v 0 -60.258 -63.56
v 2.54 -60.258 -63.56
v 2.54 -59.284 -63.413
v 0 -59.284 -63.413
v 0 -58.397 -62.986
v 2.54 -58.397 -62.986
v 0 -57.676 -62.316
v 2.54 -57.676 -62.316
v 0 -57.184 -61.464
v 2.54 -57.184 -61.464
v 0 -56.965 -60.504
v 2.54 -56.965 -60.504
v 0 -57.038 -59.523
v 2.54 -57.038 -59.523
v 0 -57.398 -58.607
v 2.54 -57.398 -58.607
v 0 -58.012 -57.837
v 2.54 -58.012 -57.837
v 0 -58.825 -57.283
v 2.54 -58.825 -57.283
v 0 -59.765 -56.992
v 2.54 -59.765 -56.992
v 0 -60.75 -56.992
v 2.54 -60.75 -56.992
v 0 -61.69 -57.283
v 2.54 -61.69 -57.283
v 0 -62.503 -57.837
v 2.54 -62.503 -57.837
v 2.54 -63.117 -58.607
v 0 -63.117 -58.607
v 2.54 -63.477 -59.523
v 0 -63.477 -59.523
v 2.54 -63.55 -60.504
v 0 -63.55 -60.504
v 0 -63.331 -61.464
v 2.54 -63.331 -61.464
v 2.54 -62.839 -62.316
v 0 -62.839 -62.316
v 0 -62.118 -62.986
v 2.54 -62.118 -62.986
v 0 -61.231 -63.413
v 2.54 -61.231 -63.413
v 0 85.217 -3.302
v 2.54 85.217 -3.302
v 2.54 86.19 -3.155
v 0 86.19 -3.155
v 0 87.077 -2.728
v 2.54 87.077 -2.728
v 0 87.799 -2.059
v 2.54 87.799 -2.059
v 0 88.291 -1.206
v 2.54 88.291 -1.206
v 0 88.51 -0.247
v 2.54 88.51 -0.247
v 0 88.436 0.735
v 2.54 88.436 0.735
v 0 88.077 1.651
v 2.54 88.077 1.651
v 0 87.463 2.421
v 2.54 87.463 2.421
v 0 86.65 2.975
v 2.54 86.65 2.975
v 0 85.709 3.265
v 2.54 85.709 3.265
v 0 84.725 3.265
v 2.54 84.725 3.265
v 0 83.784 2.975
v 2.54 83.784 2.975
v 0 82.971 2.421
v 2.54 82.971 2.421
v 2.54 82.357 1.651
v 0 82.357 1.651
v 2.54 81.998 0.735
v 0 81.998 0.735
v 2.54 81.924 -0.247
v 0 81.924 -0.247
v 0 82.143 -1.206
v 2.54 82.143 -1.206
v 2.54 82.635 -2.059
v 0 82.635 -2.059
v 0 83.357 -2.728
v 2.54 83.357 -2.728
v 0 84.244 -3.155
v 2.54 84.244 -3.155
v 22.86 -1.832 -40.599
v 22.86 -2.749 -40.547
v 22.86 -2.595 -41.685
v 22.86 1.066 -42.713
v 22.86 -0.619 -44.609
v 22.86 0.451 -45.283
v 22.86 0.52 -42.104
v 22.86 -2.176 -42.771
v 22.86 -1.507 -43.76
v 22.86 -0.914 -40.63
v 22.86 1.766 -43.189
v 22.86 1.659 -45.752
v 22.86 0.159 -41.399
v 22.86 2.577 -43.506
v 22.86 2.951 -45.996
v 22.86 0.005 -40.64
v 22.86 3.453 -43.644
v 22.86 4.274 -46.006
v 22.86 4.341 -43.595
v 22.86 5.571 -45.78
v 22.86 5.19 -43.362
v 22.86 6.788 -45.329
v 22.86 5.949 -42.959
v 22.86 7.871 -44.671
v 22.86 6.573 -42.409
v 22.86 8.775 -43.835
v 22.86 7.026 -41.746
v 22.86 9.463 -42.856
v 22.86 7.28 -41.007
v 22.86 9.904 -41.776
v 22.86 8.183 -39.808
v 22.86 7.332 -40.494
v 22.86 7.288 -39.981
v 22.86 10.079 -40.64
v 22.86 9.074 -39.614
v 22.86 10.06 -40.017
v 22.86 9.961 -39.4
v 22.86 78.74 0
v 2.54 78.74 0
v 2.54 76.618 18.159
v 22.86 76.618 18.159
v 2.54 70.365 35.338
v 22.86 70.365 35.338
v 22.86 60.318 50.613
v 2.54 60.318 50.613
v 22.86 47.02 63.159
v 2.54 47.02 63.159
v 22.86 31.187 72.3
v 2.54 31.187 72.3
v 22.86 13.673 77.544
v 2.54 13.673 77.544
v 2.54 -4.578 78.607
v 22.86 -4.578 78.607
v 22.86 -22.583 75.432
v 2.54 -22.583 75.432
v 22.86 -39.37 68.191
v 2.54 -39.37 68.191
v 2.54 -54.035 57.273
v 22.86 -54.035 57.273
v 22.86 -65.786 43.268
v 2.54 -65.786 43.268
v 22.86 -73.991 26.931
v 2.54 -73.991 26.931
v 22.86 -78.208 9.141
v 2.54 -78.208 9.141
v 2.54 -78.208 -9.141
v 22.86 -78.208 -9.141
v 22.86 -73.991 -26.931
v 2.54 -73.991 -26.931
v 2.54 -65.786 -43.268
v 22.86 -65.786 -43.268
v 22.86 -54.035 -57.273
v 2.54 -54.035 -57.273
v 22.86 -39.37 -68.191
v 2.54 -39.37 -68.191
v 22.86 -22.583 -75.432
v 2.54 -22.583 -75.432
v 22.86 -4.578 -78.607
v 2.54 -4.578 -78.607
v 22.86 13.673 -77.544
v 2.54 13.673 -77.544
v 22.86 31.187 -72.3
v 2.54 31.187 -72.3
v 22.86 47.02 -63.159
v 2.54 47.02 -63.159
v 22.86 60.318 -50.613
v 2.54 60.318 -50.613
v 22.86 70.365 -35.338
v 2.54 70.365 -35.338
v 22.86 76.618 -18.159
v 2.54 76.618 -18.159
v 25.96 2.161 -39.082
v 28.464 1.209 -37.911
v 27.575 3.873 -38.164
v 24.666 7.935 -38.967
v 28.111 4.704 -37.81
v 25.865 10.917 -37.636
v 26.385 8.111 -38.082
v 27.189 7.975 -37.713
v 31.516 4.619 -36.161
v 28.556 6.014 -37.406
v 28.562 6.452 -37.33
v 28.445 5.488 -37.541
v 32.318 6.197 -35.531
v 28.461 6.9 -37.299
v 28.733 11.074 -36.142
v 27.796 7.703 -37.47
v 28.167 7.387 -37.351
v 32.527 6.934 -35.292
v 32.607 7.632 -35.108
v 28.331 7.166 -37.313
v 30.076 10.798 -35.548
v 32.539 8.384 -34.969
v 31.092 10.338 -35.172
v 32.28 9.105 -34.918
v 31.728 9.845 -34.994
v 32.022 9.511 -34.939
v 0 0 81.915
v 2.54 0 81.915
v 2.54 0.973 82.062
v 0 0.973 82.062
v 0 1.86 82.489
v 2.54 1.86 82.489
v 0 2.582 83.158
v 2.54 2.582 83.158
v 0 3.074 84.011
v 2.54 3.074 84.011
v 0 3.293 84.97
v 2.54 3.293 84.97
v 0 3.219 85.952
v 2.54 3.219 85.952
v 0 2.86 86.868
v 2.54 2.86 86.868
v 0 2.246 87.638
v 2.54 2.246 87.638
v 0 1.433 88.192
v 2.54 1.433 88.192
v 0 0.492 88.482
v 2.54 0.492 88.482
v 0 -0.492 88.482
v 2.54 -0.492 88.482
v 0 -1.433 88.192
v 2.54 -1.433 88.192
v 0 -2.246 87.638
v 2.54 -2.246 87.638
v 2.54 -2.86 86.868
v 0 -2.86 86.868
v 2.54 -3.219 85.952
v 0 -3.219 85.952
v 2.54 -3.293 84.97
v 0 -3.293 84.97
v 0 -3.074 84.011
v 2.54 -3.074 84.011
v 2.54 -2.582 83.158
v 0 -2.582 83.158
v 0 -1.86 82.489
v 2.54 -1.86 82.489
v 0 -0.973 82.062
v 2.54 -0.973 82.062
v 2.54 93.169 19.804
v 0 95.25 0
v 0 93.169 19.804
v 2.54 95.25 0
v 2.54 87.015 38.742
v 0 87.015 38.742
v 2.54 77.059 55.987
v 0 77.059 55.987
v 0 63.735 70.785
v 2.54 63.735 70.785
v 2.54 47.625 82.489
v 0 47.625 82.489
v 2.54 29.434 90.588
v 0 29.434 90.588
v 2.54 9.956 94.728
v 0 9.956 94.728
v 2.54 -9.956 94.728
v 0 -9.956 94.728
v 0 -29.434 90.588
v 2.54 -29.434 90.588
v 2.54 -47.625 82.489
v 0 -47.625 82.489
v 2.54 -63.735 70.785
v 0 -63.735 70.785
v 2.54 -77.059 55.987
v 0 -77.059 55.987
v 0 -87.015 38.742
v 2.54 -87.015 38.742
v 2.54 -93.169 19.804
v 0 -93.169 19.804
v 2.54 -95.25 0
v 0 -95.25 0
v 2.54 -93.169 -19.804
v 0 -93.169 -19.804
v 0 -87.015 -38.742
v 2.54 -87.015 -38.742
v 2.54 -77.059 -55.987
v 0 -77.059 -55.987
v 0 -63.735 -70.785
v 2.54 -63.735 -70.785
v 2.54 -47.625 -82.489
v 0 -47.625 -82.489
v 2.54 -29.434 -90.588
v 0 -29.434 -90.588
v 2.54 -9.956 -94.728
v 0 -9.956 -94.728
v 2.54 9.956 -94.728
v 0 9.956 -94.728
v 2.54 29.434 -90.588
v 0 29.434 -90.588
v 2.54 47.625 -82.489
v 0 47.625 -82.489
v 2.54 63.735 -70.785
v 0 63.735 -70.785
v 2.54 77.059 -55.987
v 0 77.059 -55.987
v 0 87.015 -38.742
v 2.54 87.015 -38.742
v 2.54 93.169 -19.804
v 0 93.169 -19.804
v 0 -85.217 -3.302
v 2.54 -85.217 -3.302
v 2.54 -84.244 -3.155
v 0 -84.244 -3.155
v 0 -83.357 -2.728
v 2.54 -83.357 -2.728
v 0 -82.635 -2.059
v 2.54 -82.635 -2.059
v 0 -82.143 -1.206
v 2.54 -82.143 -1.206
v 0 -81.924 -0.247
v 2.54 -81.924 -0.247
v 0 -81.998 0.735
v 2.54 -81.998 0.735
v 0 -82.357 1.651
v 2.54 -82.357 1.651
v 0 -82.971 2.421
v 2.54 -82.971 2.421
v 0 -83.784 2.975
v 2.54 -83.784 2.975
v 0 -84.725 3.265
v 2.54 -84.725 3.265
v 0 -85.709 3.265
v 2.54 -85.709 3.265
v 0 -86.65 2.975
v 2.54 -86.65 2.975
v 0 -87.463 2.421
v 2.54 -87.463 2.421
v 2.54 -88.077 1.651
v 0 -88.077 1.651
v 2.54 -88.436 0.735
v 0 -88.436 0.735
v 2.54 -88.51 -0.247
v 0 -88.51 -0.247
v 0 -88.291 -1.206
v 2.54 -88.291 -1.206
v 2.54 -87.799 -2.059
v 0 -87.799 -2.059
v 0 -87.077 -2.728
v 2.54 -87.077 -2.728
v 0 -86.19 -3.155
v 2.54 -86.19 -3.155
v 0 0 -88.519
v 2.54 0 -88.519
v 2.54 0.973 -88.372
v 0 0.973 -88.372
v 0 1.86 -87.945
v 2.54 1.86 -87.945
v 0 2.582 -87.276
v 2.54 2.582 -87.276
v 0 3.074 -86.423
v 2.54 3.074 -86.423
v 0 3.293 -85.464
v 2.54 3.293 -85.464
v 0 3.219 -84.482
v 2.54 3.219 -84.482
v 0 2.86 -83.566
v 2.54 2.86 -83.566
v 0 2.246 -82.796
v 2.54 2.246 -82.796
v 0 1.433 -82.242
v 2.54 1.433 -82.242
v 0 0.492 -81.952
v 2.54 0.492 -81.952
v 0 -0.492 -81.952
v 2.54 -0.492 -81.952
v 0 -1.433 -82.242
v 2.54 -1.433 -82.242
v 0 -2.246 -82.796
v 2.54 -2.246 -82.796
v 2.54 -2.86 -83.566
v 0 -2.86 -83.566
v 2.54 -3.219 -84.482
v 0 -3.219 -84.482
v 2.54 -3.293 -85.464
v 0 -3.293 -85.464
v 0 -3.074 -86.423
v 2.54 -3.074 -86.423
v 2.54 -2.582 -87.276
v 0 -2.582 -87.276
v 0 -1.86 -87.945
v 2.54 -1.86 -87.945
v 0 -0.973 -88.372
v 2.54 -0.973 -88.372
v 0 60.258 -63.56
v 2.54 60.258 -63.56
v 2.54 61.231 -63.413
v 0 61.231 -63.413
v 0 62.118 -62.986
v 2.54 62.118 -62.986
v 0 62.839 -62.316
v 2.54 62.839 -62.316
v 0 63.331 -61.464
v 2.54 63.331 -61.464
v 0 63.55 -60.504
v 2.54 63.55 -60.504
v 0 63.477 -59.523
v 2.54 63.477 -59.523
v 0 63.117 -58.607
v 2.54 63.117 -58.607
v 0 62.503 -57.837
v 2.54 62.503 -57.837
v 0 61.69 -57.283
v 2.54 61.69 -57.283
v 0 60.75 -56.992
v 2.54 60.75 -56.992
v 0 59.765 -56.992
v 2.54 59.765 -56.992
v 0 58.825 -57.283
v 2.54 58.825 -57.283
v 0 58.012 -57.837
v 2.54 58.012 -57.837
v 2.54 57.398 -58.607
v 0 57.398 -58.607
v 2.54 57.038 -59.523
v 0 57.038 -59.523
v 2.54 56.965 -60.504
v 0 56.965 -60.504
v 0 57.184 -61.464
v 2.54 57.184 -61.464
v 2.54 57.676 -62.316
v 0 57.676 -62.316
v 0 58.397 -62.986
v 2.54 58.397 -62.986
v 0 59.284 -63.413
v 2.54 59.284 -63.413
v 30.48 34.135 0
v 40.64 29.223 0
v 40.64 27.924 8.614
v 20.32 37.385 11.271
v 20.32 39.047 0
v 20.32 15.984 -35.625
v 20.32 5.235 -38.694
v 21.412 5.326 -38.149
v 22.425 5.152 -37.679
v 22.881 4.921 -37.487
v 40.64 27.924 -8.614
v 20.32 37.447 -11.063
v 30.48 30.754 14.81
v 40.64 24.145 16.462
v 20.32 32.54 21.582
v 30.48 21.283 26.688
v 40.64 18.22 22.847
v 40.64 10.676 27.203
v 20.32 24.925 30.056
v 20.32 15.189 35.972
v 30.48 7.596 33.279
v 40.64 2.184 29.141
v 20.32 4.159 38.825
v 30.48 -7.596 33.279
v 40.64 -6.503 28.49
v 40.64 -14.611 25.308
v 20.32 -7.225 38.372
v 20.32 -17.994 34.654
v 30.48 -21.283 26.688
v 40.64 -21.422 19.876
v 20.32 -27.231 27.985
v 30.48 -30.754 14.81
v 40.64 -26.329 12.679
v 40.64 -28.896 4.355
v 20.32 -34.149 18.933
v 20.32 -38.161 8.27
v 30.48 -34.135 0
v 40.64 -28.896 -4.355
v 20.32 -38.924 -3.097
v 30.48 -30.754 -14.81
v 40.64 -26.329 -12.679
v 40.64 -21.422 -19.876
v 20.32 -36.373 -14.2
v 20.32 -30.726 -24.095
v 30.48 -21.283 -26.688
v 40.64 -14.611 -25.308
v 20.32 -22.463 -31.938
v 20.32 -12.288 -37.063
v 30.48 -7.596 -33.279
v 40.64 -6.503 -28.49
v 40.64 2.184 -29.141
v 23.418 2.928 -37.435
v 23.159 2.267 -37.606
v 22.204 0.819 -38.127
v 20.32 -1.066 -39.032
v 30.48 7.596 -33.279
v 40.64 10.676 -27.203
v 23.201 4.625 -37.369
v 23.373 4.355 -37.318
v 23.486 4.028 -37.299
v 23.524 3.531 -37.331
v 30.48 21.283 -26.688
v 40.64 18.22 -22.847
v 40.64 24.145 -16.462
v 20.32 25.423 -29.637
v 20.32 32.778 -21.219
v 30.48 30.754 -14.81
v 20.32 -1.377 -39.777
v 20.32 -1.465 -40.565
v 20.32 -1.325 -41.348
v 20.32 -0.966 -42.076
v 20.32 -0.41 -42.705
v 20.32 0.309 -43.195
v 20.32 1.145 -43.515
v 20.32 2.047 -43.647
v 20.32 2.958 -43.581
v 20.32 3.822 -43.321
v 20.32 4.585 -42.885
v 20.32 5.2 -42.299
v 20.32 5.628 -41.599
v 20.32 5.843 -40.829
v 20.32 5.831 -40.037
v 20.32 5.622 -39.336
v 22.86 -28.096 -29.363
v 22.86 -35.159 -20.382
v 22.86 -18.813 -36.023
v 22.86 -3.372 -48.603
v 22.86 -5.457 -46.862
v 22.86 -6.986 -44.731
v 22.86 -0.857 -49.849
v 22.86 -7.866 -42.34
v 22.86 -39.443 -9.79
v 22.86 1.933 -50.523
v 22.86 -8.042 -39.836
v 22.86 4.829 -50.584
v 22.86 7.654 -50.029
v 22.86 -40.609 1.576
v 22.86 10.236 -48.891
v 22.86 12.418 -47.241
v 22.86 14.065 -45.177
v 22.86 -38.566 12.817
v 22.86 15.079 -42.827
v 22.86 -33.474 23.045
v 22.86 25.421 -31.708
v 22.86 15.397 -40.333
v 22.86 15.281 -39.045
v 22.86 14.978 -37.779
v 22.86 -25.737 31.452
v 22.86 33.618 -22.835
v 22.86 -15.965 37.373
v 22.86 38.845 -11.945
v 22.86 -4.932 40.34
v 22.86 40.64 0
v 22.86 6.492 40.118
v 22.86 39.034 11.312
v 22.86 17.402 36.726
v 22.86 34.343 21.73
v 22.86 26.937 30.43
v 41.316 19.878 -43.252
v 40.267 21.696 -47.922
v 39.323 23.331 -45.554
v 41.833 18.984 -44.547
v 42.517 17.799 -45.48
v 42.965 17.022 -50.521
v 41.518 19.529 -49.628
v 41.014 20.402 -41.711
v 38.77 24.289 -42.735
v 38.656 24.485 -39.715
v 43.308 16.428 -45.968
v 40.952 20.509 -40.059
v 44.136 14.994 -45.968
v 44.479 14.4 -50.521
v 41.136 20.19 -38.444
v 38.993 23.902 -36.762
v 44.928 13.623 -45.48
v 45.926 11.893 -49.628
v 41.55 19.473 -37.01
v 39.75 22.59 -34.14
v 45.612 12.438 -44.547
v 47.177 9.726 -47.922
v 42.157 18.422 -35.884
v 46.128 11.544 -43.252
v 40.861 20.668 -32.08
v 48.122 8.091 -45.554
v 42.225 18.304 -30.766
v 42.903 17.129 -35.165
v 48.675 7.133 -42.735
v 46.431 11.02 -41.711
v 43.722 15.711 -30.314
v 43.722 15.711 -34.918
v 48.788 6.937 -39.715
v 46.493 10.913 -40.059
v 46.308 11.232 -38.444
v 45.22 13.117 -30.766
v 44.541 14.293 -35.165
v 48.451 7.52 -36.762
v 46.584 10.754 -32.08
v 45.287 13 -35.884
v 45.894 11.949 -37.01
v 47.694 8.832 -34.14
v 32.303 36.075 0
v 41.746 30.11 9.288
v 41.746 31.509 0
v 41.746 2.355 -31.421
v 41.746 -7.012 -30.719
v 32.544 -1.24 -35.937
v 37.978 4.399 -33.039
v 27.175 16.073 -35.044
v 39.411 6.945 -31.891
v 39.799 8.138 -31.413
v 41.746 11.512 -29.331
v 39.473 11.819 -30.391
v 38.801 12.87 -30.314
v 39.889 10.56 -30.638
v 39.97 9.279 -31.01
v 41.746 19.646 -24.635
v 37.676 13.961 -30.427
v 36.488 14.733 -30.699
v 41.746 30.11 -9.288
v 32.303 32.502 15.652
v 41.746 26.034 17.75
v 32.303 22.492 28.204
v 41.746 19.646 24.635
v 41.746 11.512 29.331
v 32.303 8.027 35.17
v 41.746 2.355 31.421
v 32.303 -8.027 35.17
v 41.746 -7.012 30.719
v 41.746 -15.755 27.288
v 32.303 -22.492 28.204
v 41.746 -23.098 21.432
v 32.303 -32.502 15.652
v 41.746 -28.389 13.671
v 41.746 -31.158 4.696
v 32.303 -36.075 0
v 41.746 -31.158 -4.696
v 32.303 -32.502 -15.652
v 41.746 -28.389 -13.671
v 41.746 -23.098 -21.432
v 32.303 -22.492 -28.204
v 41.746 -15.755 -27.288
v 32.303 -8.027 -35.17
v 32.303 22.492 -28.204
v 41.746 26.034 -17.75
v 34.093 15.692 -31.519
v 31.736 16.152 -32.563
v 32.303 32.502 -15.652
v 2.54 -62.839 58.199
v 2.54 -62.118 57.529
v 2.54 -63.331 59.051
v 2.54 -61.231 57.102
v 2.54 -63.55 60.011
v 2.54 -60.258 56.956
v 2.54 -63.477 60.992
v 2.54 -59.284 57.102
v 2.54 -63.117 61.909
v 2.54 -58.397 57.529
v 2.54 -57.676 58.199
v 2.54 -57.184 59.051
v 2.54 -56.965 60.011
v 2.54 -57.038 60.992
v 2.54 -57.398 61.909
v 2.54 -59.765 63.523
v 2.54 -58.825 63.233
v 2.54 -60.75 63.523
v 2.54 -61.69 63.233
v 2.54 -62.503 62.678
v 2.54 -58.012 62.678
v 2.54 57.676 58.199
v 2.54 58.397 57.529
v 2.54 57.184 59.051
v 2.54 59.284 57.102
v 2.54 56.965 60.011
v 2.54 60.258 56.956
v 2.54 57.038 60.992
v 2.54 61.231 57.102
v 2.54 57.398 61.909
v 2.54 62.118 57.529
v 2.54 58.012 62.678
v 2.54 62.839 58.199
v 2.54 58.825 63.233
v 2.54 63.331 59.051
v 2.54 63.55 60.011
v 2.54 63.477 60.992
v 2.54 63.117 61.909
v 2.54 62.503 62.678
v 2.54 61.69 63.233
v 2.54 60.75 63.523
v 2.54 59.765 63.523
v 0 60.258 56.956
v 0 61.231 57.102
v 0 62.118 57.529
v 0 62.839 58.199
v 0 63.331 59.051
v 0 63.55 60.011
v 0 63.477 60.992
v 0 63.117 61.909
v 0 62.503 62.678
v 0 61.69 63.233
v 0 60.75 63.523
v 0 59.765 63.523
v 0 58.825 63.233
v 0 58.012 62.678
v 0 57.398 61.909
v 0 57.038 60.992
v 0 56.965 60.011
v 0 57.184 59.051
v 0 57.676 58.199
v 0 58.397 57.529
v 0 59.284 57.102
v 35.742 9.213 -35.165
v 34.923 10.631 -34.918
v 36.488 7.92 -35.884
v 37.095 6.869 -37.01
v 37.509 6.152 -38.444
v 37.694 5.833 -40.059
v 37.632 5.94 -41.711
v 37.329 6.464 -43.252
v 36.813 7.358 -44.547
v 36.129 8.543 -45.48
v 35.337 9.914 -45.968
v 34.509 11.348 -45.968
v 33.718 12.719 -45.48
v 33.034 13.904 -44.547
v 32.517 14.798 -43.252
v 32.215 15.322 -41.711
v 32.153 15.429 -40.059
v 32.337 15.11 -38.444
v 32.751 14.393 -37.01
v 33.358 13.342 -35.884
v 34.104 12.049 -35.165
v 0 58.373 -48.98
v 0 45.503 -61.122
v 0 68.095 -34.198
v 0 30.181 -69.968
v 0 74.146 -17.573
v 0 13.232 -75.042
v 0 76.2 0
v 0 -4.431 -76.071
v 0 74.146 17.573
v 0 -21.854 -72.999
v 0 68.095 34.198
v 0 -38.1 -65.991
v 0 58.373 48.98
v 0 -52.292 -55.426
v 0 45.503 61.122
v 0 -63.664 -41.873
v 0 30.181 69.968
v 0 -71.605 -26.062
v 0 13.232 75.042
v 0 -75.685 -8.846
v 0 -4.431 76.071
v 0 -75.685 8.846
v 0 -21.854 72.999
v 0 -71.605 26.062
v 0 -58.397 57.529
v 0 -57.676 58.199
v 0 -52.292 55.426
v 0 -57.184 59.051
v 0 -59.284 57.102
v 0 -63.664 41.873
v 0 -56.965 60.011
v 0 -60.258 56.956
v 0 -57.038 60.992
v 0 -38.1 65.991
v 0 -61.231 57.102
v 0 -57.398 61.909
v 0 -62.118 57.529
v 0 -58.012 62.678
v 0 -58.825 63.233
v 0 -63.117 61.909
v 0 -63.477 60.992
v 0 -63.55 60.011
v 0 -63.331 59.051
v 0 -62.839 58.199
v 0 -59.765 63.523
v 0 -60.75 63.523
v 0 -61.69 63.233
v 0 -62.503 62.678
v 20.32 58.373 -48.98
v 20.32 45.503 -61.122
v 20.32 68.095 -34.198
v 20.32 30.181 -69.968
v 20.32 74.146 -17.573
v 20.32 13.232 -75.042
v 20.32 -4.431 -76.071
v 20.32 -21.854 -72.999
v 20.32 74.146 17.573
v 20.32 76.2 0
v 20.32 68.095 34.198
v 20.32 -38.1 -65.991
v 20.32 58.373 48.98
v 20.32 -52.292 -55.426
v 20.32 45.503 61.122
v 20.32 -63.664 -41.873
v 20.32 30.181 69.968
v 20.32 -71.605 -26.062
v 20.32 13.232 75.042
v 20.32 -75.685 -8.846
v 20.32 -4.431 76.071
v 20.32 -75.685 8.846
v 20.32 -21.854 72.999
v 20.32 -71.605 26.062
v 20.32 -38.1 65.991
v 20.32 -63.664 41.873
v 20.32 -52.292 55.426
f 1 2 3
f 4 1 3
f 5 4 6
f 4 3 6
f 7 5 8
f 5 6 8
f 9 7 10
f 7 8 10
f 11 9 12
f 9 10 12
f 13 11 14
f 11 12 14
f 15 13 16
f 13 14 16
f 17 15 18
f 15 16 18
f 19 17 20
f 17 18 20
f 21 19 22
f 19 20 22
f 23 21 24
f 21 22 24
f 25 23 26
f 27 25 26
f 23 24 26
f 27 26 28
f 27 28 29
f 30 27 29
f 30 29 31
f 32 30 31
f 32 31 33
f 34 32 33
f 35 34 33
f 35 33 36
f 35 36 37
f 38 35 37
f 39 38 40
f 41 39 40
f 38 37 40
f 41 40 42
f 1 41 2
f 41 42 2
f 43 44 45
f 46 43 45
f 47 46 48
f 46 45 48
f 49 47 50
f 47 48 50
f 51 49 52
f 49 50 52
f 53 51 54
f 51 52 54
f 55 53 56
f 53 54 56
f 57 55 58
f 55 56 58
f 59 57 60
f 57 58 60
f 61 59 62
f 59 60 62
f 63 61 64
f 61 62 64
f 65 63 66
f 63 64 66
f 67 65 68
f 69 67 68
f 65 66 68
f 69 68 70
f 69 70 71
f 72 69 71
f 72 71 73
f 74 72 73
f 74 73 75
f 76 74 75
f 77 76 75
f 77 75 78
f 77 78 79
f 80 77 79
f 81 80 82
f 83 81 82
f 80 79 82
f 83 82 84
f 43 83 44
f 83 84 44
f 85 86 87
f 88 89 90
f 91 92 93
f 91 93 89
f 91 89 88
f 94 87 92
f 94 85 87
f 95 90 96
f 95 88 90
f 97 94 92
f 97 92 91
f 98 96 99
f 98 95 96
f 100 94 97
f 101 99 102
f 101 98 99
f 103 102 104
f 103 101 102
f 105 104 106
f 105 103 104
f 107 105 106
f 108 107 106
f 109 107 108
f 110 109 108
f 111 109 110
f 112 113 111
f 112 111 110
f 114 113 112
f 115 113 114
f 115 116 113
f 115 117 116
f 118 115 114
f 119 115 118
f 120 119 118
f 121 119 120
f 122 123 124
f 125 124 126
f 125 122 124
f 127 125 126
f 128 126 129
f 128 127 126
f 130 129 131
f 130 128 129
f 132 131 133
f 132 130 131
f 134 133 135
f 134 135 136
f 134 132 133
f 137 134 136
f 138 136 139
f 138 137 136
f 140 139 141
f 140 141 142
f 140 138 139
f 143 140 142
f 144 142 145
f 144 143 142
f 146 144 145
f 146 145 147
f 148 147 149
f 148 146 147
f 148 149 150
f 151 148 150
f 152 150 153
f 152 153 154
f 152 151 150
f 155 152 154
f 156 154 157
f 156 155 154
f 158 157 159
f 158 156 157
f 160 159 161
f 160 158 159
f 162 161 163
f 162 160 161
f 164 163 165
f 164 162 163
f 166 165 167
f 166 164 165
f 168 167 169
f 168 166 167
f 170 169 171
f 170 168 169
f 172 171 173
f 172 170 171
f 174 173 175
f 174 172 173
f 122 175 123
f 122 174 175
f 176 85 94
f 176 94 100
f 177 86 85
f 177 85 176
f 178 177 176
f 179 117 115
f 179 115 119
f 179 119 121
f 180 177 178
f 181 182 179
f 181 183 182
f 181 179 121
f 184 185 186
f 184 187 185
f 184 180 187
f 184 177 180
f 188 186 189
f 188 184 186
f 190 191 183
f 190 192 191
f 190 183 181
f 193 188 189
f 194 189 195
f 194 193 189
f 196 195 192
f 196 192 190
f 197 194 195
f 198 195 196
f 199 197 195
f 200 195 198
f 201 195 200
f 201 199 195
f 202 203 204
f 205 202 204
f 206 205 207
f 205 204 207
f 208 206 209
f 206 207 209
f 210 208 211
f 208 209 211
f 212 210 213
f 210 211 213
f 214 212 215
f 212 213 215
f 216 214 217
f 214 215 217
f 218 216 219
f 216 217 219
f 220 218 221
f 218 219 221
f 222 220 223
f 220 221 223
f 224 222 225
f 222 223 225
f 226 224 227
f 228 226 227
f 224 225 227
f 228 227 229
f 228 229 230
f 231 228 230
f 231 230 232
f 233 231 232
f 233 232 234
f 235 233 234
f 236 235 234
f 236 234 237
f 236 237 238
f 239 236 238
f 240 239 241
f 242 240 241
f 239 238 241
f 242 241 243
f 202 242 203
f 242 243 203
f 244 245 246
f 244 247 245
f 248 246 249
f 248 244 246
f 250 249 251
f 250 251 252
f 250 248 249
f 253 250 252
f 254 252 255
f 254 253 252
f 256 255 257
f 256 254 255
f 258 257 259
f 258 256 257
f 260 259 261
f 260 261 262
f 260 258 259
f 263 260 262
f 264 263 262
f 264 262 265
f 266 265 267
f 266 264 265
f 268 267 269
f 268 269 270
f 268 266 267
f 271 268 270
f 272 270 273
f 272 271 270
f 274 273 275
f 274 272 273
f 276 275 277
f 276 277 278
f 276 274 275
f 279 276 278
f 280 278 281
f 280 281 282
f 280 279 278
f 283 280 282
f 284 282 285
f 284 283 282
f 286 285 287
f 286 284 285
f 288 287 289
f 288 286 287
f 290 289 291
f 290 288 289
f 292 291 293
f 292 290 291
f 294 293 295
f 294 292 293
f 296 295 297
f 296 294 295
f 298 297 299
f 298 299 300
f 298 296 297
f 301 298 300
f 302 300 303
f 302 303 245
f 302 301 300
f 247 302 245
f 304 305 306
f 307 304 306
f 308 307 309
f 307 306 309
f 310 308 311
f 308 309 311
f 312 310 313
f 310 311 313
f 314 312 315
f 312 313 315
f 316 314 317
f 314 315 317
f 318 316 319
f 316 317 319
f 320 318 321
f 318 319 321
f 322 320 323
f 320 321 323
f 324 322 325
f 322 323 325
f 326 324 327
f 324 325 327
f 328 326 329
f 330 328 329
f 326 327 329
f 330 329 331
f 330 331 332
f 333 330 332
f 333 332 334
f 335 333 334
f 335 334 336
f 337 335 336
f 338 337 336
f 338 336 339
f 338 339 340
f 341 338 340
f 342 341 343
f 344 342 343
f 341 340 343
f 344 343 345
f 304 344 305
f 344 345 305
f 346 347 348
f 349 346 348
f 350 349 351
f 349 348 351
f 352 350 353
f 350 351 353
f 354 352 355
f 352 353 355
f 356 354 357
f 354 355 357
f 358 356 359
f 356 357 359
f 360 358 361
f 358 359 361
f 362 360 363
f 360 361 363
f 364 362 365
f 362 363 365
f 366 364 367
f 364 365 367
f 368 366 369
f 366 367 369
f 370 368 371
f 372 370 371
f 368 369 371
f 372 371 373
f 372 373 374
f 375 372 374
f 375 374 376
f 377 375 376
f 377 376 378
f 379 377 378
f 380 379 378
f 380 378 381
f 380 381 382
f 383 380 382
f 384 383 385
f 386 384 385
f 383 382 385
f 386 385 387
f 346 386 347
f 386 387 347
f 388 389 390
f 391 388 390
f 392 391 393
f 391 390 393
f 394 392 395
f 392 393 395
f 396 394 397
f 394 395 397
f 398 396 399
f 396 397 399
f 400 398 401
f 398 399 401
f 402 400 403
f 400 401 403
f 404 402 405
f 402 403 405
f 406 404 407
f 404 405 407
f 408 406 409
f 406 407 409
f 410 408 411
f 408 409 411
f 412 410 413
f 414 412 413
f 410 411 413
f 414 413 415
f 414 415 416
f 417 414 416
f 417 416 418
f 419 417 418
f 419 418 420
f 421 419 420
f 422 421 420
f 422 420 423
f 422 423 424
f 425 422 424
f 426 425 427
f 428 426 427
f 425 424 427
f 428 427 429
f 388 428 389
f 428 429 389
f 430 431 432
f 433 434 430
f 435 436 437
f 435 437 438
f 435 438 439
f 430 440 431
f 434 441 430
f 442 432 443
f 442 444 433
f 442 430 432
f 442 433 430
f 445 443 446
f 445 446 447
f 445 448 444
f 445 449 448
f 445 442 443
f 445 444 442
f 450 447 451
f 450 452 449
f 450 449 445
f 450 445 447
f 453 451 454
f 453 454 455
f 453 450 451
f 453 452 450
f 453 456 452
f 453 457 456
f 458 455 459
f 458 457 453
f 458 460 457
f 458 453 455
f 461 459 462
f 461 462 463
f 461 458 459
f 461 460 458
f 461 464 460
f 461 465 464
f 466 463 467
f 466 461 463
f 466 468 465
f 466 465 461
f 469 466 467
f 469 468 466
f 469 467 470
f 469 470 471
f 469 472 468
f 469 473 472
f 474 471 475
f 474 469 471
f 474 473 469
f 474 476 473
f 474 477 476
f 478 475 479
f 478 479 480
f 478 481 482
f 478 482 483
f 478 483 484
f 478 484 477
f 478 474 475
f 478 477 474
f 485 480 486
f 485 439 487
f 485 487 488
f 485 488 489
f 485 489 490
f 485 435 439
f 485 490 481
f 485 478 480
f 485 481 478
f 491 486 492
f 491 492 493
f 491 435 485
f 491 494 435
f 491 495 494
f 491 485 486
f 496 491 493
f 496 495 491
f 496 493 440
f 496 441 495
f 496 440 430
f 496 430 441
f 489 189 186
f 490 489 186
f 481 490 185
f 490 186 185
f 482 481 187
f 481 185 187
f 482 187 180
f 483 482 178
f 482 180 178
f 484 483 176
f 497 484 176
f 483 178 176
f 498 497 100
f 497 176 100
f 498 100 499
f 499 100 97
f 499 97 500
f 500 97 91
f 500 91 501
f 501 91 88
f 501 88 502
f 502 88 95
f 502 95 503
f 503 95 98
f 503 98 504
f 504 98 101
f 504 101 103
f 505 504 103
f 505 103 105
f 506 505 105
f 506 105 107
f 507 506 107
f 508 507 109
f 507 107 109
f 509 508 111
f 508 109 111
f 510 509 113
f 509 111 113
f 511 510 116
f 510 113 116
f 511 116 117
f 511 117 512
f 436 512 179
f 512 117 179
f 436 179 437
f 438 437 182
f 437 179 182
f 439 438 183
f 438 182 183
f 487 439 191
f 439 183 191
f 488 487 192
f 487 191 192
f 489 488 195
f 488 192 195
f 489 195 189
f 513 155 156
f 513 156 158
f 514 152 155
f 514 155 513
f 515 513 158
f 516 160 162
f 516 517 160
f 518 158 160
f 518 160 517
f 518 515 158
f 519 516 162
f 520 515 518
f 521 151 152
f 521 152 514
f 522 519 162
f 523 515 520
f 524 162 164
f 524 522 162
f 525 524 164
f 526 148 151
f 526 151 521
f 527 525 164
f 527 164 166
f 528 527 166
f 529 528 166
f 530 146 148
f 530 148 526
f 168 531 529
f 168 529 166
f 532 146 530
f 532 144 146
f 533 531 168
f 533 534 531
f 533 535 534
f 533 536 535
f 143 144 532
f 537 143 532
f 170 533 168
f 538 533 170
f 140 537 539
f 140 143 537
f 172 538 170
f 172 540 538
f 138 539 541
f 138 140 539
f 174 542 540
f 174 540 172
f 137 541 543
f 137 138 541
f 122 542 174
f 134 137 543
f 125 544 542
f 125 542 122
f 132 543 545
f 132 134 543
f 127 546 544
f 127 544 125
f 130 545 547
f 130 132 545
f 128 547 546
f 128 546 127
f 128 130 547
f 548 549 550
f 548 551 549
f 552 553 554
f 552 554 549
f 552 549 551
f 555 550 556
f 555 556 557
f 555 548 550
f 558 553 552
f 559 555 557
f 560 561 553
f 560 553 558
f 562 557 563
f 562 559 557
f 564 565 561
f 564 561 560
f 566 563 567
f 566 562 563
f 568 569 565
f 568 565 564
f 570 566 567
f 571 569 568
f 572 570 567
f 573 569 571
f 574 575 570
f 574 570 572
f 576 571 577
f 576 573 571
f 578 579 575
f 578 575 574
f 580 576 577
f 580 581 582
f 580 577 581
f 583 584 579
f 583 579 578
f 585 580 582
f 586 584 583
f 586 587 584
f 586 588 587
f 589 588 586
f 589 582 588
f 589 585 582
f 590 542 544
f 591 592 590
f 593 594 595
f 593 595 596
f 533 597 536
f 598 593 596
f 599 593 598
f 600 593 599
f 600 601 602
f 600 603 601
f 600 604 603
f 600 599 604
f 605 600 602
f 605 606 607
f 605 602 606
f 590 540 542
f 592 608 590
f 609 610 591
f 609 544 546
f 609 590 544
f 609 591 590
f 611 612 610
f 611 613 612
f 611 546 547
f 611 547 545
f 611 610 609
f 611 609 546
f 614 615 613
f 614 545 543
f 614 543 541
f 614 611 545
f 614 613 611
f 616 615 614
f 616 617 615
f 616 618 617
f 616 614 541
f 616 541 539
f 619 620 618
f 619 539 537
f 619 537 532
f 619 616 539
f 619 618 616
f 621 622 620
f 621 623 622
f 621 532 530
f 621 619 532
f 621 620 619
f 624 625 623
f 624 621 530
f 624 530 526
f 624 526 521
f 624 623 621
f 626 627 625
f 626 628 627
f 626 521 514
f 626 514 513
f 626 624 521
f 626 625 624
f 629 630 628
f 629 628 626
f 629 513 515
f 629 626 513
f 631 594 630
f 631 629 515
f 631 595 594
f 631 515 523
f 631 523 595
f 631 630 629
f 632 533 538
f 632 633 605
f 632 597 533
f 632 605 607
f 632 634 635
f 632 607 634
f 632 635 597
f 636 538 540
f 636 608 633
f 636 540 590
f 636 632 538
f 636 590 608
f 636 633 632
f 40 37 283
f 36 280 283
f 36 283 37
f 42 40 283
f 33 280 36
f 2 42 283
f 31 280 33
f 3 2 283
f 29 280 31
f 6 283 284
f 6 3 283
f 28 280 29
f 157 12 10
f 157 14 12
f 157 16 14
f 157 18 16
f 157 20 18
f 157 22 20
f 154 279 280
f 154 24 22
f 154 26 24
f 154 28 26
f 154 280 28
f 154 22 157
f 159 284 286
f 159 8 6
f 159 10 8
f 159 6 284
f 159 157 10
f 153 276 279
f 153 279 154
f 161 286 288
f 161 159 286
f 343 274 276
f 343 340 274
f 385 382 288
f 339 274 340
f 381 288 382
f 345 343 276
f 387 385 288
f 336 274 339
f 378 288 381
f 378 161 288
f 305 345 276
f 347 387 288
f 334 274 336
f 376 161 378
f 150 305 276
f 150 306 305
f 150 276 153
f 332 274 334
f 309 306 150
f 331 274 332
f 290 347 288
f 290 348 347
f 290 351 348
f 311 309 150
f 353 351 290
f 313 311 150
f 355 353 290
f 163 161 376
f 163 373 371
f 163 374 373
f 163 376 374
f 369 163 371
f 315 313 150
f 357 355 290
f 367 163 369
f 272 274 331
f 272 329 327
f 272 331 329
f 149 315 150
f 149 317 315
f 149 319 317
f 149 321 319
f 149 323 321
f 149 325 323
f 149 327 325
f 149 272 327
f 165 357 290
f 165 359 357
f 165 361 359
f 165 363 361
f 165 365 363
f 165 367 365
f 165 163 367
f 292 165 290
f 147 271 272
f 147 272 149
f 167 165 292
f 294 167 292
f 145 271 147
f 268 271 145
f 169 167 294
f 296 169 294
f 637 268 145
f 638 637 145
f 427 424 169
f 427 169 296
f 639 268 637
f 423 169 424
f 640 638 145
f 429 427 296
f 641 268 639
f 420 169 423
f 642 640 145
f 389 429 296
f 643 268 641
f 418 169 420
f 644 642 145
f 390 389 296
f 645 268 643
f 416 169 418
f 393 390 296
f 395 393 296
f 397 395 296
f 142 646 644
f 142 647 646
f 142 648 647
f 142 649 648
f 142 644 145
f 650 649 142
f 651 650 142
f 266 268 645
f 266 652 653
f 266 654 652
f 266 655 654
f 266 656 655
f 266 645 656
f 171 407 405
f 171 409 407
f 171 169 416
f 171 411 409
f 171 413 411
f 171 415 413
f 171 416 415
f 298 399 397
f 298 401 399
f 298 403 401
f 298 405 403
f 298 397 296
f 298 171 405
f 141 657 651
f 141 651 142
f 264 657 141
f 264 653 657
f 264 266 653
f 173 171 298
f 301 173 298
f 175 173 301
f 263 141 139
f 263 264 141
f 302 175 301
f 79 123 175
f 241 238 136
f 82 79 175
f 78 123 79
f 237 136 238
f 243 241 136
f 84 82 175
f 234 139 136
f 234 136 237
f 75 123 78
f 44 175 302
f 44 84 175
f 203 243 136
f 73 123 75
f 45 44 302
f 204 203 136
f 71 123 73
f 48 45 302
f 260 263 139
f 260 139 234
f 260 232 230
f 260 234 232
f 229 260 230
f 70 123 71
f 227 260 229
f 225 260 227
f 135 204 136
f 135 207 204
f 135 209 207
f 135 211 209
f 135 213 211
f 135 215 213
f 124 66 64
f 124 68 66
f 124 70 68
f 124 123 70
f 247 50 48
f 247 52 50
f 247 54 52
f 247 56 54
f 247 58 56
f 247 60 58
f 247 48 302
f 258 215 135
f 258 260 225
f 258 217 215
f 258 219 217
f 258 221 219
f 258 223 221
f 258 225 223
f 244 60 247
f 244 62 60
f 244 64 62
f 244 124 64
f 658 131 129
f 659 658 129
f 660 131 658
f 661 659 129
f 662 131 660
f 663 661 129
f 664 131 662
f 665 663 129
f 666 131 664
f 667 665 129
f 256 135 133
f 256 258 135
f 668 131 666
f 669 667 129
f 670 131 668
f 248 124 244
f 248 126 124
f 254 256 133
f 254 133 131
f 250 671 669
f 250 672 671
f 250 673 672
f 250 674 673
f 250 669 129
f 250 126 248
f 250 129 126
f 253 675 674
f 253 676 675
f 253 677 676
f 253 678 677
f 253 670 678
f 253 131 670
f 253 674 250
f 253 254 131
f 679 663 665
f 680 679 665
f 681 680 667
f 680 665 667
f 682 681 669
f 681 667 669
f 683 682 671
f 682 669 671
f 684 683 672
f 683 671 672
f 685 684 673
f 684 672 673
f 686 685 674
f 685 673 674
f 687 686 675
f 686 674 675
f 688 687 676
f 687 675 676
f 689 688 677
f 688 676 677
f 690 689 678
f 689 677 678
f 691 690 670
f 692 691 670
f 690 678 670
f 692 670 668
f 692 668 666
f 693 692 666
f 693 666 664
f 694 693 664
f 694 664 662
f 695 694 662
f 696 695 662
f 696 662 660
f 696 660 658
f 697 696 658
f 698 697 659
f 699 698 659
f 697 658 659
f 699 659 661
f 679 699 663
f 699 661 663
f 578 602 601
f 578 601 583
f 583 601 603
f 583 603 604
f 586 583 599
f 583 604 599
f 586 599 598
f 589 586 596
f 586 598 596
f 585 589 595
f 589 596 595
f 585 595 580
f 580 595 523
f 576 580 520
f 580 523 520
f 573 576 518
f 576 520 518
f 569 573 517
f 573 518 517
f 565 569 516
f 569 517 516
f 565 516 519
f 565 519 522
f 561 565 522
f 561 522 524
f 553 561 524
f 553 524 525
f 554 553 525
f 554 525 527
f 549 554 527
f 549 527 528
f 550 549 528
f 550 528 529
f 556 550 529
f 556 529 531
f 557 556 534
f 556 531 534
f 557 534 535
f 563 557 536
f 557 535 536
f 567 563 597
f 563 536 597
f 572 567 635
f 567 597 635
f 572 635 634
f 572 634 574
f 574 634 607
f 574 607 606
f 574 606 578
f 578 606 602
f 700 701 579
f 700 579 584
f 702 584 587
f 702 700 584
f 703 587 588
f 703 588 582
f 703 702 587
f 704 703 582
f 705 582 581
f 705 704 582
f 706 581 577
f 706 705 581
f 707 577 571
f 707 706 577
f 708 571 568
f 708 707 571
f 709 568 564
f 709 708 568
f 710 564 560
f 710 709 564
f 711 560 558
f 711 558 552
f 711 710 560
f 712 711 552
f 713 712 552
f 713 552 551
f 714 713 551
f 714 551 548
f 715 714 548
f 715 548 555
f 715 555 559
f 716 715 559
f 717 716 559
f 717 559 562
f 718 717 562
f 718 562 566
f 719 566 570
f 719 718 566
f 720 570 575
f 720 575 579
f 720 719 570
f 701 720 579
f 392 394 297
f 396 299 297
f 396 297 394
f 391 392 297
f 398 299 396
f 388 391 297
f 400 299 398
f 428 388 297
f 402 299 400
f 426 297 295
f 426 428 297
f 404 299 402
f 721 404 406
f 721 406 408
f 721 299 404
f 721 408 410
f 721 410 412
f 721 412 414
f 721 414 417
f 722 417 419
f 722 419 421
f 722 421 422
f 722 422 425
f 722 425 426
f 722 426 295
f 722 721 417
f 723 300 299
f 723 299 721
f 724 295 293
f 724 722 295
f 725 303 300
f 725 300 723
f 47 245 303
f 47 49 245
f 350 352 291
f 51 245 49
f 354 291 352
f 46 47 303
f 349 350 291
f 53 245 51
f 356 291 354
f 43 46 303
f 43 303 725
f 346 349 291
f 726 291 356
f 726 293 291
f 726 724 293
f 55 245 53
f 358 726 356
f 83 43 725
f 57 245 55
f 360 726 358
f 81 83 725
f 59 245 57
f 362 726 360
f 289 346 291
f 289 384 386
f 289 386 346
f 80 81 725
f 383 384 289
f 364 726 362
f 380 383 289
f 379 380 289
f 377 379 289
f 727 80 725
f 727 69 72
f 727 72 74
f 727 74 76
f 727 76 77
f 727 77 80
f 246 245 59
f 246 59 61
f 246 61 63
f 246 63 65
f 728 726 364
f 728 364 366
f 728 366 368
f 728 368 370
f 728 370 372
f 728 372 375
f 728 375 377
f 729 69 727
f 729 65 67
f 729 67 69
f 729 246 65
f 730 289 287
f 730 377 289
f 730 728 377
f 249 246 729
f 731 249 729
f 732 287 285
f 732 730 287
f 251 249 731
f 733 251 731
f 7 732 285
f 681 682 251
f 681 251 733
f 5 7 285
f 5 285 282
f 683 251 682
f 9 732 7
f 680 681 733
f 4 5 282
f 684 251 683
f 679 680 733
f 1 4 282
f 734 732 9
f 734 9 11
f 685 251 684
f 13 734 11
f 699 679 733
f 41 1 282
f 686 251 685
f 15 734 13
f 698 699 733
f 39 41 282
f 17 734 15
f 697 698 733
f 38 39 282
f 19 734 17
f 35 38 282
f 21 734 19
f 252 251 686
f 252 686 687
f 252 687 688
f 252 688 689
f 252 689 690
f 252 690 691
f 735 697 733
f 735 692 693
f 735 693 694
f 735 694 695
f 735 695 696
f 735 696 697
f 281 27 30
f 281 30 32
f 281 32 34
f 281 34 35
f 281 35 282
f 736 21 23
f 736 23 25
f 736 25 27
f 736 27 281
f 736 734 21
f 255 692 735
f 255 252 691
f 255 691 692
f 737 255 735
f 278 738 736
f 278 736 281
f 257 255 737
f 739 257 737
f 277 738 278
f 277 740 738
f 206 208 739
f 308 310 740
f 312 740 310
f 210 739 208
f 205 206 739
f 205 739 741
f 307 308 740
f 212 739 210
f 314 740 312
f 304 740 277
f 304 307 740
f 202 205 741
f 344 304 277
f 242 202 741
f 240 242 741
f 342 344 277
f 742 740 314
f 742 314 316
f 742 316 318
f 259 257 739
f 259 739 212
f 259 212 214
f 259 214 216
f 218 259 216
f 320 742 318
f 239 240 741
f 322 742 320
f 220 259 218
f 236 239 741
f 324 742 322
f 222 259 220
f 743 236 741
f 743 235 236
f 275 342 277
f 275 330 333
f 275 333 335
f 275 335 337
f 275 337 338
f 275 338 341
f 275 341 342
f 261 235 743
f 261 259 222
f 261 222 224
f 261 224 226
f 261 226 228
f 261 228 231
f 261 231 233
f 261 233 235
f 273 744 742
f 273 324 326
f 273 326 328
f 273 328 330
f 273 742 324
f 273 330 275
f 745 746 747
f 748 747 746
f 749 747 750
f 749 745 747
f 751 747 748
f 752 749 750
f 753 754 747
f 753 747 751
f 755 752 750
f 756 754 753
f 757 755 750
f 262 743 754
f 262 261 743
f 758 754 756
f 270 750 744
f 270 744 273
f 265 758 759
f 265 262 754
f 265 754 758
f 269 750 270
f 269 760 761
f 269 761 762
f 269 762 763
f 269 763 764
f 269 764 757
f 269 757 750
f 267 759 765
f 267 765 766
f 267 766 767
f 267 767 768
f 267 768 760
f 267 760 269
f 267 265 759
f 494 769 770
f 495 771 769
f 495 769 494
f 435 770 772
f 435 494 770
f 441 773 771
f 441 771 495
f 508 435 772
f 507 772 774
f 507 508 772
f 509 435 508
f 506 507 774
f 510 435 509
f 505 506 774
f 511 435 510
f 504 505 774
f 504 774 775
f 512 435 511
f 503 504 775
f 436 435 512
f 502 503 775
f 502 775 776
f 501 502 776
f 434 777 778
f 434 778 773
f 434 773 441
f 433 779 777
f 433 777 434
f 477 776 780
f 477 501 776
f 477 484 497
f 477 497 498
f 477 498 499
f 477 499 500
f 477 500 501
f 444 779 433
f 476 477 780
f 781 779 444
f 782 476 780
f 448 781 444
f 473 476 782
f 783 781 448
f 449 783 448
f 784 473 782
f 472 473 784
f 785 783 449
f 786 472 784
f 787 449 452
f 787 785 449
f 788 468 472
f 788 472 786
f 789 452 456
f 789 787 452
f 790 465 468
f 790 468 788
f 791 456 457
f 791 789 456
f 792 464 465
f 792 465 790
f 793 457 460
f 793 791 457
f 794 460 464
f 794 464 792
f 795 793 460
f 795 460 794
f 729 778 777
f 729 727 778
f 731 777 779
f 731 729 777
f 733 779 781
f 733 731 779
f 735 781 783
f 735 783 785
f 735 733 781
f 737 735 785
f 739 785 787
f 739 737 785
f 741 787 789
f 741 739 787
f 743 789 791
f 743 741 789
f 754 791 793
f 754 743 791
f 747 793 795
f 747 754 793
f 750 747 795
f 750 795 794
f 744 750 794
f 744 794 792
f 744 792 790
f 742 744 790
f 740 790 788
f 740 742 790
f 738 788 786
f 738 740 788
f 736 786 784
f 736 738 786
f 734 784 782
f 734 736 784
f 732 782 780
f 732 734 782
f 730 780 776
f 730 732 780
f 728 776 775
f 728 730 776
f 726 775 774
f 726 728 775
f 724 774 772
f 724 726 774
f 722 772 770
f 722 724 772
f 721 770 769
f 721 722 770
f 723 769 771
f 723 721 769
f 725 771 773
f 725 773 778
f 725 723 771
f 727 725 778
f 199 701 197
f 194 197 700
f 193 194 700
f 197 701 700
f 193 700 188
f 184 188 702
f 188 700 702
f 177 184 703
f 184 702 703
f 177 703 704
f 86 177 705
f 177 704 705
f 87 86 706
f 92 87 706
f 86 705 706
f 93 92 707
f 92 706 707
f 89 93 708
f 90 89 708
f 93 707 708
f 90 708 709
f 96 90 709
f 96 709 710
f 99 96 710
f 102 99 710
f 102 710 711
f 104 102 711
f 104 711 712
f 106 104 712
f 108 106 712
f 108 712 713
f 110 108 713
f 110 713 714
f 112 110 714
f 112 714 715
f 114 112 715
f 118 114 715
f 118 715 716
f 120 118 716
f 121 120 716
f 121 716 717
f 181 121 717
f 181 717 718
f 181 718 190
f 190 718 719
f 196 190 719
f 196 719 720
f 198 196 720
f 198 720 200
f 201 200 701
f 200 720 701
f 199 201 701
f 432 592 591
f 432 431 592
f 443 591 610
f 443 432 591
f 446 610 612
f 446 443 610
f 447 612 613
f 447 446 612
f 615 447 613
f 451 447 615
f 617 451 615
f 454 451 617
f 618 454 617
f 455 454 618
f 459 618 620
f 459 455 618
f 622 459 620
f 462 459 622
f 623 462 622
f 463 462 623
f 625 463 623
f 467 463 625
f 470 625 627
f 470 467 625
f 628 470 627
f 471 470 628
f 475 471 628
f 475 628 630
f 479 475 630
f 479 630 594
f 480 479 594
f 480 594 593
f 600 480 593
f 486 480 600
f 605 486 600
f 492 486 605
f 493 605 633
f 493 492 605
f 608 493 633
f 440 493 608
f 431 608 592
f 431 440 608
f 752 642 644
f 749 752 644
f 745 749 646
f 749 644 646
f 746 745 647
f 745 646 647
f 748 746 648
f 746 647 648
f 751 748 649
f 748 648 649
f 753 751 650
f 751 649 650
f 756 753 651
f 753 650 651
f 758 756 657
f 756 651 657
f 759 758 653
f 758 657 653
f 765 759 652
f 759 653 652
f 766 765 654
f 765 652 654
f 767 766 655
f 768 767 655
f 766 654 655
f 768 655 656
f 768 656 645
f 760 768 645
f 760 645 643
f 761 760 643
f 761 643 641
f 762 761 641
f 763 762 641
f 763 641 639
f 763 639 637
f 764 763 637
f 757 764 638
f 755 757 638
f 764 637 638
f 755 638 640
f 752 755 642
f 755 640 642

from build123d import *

# Parameters (mm, degrees)
SKETCH2_R                       = 3.302
CUT_EXTRUDE1_DEPTH              = 2.54
BOSS_EXTRUDE1_REACH             = 85.185
SKETCH3_R                       = 10.16
SKETCH3_R_2                     = 5.55625
BOSS_EXTRUDE1_DIRECTION_2_DEPTH = 10.16
CUT_EXTRUDE2_REACH              = 85.185
SKETCH3_7_R                     = 3.175


with BuildPart() as part:
    # Sketch1 → Revolve1 (revolve)
    with BuildSketch(Plane.XY):
        Polygon((0, 95.25), (2.54, 95.25), (2.54, 78.74), (22.86, 78.74), (22.86, 40.64), (41.745574265, 31.509467488), (40.64, 29.2227), (20.32, 39.046728544), (20.32, 76.2), (0, 76.2), align=None)
    revolve(axis=Axis((0, 0, 0), (1, 0, 0)))

    # Sketch2 → Cut-Extrude1 (cut)
    with BuildSketch(Plane(origin=(2.54, 0, 0), x_dir=(0, 0, -1), z_dir=(1, 0, 0))):
        with Locations((0, 85.217)):
            Circle(SKETCH2_R)
        with Locations((60.257518572, 60.257518572)):
            Circle(SKETCH2_R)
        with Locations((85.217, 0)):
            Circle(SKETCH2_R)
        with Locations((60.257518572, -60.257518572)):
            Circle(SKETCH2_R)
        with Locations((0, -85.217)):
            Circle(SKETCH2_R)
        with Locations((-60.257518572, -60.257518572)):
            Circle(SKETCH2_R)
        with Locations((-85.217, 0)):
            Circle(SKETCH2_R)
        with Locations((-60.257518572, 60.257518572)):
            Circle(SKETCH2_R)
    extrude(amount=-CUT_EXTRUDE1_DEPTH, mode=Mode.SUBTRACT)

    # Sketch3 → Boss-Extrude1 (add, up to next)
    with BuildSketch(Plane(origin=(30.795863359, 17.78, 0), x_dir=(0, 0, 1), z_dir=(0.866025404, 0.5, 0)), mode=Mode.PRIVATE) as boss_extrude1_sk1:
        with Locations((-40.474297606, 8.255)):
            Circle(SKETCH3_R)
        with Locations((-40.474297606, 8.255)):
            Circle(SKETCH3_R_2, mode=Mode.SUBTRACT)
    boss_extrude1_tool1 = extrude(boss_extrude1_sk1.sketch, amount=-BOSS_EXTRUDE1_REACH, mode=Mode.PRIVATE) - part.part
    add(boss_extrude1_tool1.solids().sort_by_distance((34.923363, 10.63096, -50.346929))[0])

    # Sketch3 → Boss-Extrude1 direction 2 (add)
    with BuildSketch(Plane(origin=(30.795863359, 17.78, 0), x_dir=(0, 0, 1), z_dir=(0.866025404, 0.5, 0))):
        with Locations((-40.474297606, 8.255)):
            Circle(SKETCH3_R)
        with Locations((-40.474297606, 8.255)):
            Circle(SKETCH3_R_2, mode=Mode.SUBTRACT)
    extrude(amount=BOSS_EXTRUDE1_DIRECTION_2_DEPTH)

    # Sketch3_7 → Cut-Extrude2 (cut, up to next)
    with BuildSketch(Plane(origin=(30.795863359, 17.78, 0), x_dir=(0, 0, 1), z_dir=(0.866025404, 0.5, 0)), mode=Mode.PRIVATE) as cut_extrude2_sk1:
        with Locations((-40.474297606, 8.255)):
            Circle(SKETCH3_7_R)
    cut_extrude2_tool1 = extrude(cut_extrude2_sk1.sketch, amount=-CUT_EXTRUDE2_REACH, mode=Mode.PRIVATE) & part.part
    add(cut_extrude2_tool1.solids().sort_by_distance((34.923363, 10.63096, -40.474298))[0], mode=Mode.SUBTRACT)


solid = part.part
